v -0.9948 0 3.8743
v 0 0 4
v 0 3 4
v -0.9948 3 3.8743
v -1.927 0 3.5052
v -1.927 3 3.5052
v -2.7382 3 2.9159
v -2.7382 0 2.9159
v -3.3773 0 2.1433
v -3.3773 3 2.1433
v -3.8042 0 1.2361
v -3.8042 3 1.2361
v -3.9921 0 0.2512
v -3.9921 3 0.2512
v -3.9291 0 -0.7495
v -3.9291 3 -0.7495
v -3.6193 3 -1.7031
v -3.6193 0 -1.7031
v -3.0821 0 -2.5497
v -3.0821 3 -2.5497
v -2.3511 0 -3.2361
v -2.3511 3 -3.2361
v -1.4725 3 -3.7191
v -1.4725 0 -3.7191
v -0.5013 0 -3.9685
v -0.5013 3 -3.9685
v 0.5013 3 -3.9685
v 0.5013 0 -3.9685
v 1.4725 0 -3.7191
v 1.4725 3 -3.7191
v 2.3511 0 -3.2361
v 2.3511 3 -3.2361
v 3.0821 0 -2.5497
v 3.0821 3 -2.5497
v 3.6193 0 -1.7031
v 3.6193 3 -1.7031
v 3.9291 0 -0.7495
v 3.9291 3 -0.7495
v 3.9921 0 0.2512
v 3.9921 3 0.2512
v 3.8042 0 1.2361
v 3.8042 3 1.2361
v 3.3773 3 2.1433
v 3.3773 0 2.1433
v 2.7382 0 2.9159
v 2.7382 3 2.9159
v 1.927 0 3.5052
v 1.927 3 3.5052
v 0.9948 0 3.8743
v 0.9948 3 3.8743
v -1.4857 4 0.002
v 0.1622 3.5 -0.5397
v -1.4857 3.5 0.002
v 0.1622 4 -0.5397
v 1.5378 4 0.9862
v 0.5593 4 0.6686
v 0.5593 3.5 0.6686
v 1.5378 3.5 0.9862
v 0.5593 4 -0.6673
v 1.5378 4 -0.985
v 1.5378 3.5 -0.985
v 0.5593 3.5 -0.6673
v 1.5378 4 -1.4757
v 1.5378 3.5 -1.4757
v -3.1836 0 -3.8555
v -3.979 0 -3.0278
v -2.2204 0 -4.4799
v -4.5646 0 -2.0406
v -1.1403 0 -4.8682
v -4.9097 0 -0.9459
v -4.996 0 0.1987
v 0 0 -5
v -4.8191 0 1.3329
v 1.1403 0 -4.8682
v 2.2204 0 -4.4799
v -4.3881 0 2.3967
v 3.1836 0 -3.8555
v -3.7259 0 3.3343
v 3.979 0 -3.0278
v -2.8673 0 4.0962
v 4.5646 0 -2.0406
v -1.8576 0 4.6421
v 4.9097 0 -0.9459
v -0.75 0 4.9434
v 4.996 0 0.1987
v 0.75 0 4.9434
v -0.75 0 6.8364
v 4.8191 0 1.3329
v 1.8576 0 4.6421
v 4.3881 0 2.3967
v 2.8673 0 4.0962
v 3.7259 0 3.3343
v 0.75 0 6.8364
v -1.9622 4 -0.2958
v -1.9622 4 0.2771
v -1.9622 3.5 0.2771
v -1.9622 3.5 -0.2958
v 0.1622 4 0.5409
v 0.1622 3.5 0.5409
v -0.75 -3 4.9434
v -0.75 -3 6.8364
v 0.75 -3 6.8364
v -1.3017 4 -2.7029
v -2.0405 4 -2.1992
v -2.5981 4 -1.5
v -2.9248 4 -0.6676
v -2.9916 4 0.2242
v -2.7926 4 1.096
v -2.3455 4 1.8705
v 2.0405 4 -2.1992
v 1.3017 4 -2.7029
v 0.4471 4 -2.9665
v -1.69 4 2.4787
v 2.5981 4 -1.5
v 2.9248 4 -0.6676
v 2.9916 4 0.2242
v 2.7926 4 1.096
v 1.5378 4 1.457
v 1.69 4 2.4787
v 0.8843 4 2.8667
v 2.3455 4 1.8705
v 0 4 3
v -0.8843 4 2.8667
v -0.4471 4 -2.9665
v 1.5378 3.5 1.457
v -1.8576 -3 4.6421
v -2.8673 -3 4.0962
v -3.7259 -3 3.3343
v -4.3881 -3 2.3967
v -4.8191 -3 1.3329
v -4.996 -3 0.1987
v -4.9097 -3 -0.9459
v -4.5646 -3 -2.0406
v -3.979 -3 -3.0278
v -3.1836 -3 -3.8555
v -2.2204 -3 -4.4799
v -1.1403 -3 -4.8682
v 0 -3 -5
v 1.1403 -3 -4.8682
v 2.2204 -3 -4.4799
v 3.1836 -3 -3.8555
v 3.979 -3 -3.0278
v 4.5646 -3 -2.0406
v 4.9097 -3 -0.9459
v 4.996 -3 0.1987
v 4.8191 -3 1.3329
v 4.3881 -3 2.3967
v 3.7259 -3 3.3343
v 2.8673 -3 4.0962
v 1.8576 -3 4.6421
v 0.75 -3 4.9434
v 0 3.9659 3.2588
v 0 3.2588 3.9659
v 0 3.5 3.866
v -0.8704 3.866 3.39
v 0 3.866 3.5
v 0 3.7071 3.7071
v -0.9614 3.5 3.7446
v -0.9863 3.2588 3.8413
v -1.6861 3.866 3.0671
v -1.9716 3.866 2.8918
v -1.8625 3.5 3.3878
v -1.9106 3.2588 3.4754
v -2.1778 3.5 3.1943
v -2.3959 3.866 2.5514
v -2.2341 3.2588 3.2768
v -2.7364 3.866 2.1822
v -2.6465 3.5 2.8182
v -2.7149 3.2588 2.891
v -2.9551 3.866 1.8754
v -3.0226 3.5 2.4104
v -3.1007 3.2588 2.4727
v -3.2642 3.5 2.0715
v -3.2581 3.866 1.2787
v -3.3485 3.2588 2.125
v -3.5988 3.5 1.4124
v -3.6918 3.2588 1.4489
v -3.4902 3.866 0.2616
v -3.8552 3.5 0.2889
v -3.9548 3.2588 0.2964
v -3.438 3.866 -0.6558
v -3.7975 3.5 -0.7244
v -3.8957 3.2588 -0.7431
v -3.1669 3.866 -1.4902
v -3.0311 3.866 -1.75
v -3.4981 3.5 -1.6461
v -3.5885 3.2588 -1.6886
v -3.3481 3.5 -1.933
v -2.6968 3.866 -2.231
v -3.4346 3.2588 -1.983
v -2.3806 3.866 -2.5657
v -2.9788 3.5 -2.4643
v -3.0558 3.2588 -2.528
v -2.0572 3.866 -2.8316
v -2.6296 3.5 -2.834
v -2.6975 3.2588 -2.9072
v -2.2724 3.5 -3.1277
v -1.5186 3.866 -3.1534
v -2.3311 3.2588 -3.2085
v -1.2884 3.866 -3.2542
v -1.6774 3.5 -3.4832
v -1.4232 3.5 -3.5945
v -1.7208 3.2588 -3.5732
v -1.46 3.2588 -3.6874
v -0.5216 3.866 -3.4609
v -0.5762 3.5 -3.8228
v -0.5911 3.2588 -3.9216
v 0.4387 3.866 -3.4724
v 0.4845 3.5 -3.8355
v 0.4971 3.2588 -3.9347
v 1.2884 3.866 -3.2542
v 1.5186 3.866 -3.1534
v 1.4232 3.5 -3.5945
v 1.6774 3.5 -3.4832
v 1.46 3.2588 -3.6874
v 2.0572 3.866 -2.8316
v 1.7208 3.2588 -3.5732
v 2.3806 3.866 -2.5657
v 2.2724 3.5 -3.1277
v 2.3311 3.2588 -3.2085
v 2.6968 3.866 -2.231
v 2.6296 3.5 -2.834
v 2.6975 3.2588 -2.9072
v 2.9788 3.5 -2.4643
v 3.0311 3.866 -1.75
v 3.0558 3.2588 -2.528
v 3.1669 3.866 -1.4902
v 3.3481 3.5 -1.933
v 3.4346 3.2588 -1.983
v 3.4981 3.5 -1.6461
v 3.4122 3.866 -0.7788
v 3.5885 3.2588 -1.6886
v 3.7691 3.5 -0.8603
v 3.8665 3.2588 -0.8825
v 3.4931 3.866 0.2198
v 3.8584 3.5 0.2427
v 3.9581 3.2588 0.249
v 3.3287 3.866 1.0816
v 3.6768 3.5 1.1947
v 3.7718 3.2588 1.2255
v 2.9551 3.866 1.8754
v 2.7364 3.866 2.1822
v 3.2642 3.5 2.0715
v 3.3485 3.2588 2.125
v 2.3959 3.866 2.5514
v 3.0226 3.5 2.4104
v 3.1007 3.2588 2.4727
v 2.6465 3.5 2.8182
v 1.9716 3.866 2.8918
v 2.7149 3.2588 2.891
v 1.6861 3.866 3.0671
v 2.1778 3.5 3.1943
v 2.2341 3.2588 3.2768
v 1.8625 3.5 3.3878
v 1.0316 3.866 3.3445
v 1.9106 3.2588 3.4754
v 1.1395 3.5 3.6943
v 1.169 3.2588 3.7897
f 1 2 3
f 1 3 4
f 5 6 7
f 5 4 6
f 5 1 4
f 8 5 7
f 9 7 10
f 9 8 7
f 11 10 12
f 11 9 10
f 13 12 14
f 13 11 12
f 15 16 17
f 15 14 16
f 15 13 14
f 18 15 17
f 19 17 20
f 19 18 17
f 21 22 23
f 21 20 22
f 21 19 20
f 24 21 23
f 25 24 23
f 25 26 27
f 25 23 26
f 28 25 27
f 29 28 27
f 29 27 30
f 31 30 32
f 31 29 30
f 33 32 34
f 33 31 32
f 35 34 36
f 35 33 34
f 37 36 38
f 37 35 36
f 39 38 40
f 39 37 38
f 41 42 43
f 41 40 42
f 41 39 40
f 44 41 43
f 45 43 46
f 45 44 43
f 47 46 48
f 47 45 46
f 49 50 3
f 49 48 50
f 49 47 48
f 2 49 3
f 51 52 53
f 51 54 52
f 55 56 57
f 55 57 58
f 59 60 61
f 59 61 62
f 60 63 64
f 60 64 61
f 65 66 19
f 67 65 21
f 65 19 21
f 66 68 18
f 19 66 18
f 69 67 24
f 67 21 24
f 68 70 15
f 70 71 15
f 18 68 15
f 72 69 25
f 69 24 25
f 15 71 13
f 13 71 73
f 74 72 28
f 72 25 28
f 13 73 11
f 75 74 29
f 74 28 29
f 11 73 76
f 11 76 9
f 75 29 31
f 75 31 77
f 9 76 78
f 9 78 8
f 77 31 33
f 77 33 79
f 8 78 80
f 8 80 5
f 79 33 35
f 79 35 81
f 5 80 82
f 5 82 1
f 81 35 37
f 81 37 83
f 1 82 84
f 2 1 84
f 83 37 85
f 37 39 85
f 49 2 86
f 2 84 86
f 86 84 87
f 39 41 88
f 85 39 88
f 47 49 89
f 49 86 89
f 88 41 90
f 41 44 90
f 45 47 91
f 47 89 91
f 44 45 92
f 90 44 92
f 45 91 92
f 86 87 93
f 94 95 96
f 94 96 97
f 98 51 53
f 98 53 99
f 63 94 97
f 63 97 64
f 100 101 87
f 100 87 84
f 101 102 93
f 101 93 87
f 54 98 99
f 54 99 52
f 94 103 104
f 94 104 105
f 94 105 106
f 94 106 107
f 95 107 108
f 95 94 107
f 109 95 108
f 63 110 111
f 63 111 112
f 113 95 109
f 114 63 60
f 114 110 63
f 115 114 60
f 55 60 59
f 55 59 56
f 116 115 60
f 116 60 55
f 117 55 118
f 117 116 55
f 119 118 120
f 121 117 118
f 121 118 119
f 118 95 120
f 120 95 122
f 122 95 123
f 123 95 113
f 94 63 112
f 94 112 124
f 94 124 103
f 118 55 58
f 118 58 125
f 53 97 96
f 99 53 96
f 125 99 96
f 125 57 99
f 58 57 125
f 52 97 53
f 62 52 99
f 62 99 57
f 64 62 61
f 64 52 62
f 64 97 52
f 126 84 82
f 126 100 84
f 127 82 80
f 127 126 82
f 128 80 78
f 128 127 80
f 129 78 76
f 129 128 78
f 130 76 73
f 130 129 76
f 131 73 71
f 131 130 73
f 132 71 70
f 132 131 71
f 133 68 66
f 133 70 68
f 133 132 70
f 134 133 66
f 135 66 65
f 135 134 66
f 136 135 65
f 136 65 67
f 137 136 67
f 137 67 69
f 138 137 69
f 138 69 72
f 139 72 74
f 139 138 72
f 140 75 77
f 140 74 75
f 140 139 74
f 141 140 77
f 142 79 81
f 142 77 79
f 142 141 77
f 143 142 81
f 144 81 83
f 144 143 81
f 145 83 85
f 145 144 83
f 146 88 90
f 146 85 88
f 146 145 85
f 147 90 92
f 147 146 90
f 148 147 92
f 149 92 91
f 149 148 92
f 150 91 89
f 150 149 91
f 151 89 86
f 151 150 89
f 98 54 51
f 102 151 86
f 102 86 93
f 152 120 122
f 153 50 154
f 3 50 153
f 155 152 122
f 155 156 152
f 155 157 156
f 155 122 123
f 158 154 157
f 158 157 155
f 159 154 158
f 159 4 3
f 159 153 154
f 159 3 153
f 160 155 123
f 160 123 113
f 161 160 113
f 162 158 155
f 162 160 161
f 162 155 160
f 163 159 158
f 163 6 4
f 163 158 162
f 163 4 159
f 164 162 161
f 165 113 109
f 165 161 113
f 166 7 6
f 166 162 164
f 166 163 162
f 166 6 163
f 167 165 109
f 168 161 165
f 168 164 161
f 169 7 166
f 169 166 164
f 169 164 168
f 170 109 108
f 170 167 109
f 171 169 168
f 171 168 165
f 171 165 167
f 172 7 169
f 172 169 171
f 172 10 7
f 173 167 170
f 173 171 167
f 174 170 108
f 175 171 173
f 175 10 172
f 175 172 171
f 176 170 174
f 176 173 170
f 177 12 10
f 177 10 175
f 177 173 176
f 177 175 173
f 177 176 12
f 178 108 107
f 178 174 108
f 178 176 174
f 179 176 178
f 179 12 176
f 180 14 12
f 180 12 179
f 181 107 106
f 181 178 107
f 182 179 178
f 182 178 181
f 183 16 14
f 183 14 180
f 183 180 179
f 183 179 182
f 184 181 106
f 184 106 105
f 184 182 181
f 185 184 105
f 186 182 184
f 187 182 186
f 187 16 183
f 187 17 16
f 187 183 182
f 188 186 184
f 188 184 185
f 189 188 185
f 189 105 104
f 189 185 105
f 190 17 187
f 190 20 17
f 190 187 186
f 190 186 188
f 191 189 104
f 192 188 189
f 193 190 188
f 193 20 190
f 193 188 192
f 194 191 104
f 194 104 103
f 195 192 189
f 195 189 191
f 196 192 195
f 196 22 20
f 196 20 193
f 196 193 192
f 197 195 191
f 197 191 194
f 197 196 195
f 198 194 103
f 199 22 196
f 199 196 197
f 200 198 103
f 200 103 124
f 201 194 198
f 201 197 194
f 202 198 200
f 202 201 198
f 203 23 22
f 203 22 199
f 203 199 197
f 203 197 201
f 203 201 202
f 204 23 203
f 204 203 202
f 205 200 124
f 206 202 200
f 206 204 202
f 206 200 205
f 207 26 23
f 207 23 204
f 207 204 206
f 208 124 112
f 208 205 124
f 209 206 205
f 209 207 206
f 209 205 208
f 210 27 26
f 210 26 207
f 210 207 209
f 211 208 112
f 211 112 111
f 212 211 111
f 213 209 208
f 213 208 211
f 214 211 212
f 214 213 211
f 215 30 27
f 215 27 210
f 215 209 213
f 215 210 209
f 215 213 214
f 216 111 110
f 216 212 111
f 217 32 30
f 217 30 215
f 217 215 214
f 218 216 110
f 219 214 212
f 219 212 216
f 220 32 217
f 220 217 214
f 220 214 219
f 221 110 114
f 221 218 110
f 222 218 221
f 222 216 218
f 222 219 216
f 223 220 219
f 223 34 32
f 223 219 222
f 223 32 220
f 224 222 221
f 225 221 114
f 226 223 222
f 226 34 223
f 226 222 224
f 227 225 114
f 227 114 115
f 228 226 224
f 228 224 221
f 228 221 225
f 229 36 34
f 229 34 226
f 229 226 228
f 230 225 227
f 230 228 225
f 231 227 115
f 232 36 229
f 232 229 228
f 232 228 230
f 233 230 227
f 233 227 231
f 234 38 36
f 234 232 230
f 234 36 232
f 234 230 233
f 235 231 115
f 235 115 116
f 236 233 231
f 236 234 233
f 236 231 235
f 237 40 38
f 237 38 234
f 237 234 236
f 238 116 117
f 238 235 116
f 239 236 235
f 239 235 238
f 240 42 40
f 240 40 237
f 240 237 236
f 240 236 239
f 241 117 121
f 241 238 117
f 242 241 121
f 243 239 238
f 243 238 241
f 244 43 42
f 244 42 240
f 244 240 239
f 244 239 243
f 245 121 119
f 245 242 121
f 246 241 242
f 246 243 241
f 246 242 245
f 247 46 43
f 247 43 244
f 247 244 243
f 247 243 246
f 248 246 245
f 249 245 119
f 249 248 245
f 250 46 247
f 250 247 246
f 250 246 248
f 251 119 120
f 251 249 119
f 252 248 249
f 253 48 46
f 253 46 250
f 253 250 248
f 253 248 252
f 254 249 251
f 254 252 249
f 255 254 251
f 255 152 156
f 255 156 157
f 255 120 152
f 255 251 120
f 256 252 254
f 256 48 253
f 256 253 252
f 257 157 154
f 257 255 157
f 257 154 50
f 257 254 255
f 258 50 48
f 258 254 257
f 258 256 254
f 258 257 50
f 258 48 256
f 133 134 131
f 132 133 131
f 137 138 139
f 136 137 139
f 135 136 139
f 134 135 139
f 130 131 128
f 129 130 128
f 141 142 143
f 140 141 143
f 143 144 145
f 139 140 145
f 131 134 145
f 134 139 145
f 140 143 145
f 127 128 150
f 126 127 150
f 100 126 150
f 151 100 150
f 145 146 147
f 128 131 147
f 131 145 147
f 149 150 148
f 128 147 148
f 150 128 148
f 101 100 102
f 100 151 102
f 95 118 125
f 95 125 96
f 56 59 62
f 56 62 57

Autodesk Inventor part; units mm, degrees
ref_plane "YZ Plane" through (0, 0, 0) normal (1, 0, 0) x (0, 1, 0)
ref_plane "XZ Plane" through (0, 0, 0) normal (0, 1, 0) x (-1, 0, 0)
ref_plane "XY Plane" through (0, 0, 0) normal (0, 0, 1) x (1, 0, 0)
sketch "Skizze1" plane through (0, 0, 0) normal (1, 0, 0) x (0, 1, 0)
  line L0 (4, 0) -> (4, 3)
  arc A0 (4, 3) -> (3, 4) centre (3, 3) ccw
  line L1 (3, 4) -> (0, 4)
  line L2 (0, 4) -> (0, 5)
  line L3 (0, 5) -> (-3, 5)
  line L4 (-3, 5) -> (-3, 2)
  line L5 (0, 0) -> (4, 0)
  line L6 (-3, 2) -> (-3, 0)
  line L7 (-3, 0) -> (0, 0)
  point P0 (0, 2)
  dimension "d0" = 2
  dimension "d1" = 4
  dimension "d2" = 3
  dimension "d3" = 5
  dimension "d4" = 3
  dimension "d5" = 1
  dimension "d6" = 1
revolve "Umdrehung1" add sketch "Skizze1" angle 360 about axis through (0, 0, 0) along (0, 1, 0)
sketch "Skizze2" plane through (0, 4, 0) normal (0, 1, 0) x (1, 0, 0)
  line L0 (-1.9622, -1.4344) -> (-1.9622, 1.4984) construction
  line L1 (-1.9622, 1.4984) -> (1.5378, 1.4984) construction
  line L2 (1.5378, 1.4984) -> (1.5378, -1.4344) construction
  line L3 (1.5378, -1.4344) -> (-1.9622, -1.4344) construction
  line L4 (1.5378, -1.457) -> (-1.9622, -0.2771)
  line L5 (-1.9622, -0.2771) -> (-1.9622, 0.2958)
  line L6 (-1.9622, 0.2958) -> (1.5378, 1.4757)
  line L7 (1.5378, 1.4757) -> (1.5378, 0.985)
  line L8 (1.5378, 0.985) -> (0.5593, 0.6673)
  line L9 (0.5593, 0.6673) -> (0.5593, -0.6686)
  line L10 (0.5593, -0.6686) -> (1.5378, -0.9862)
  line L11 (1.5378, -0.9862) -> (1.5378, -1.457)
  line L12 (0.1622, 0.5397) -> (-1.4857, -0.002)
  line L13 (-1.4857, -0.002) -> (0.1622, -0.5409)
  line L14 (0.1622, -0.5409) -> (0.1622, 0.5397)
  point P0 (0, 0)
extrude "Extrusion1" cut sketch "Skizze2" against normal blind 0.5
sketch "Skizze4" plane through (0, -3, 0) normal (0, -1, 0) x (1, 0, 0)
  line L0 (0.75, 6.8364) -> (-0.75, 6.8364)
  line L1 (-0.75, 6.8364) -> (-0.75, 4.8364)
  line L2 (-0.75, 4.8364) -> (0.75, 4.8364)
  line L3 (0.75, 4.8364) -> (0.75, 6.8364)
  point P0 (0, 0)
  dimension "d15" = 1.5
  dimension "d16" = 2
  dimension "d19" = 0.75
extrude "Extrusion3" add sketch "Skizze4" against normal blind 3
properties part number "ButtonA_neu"
